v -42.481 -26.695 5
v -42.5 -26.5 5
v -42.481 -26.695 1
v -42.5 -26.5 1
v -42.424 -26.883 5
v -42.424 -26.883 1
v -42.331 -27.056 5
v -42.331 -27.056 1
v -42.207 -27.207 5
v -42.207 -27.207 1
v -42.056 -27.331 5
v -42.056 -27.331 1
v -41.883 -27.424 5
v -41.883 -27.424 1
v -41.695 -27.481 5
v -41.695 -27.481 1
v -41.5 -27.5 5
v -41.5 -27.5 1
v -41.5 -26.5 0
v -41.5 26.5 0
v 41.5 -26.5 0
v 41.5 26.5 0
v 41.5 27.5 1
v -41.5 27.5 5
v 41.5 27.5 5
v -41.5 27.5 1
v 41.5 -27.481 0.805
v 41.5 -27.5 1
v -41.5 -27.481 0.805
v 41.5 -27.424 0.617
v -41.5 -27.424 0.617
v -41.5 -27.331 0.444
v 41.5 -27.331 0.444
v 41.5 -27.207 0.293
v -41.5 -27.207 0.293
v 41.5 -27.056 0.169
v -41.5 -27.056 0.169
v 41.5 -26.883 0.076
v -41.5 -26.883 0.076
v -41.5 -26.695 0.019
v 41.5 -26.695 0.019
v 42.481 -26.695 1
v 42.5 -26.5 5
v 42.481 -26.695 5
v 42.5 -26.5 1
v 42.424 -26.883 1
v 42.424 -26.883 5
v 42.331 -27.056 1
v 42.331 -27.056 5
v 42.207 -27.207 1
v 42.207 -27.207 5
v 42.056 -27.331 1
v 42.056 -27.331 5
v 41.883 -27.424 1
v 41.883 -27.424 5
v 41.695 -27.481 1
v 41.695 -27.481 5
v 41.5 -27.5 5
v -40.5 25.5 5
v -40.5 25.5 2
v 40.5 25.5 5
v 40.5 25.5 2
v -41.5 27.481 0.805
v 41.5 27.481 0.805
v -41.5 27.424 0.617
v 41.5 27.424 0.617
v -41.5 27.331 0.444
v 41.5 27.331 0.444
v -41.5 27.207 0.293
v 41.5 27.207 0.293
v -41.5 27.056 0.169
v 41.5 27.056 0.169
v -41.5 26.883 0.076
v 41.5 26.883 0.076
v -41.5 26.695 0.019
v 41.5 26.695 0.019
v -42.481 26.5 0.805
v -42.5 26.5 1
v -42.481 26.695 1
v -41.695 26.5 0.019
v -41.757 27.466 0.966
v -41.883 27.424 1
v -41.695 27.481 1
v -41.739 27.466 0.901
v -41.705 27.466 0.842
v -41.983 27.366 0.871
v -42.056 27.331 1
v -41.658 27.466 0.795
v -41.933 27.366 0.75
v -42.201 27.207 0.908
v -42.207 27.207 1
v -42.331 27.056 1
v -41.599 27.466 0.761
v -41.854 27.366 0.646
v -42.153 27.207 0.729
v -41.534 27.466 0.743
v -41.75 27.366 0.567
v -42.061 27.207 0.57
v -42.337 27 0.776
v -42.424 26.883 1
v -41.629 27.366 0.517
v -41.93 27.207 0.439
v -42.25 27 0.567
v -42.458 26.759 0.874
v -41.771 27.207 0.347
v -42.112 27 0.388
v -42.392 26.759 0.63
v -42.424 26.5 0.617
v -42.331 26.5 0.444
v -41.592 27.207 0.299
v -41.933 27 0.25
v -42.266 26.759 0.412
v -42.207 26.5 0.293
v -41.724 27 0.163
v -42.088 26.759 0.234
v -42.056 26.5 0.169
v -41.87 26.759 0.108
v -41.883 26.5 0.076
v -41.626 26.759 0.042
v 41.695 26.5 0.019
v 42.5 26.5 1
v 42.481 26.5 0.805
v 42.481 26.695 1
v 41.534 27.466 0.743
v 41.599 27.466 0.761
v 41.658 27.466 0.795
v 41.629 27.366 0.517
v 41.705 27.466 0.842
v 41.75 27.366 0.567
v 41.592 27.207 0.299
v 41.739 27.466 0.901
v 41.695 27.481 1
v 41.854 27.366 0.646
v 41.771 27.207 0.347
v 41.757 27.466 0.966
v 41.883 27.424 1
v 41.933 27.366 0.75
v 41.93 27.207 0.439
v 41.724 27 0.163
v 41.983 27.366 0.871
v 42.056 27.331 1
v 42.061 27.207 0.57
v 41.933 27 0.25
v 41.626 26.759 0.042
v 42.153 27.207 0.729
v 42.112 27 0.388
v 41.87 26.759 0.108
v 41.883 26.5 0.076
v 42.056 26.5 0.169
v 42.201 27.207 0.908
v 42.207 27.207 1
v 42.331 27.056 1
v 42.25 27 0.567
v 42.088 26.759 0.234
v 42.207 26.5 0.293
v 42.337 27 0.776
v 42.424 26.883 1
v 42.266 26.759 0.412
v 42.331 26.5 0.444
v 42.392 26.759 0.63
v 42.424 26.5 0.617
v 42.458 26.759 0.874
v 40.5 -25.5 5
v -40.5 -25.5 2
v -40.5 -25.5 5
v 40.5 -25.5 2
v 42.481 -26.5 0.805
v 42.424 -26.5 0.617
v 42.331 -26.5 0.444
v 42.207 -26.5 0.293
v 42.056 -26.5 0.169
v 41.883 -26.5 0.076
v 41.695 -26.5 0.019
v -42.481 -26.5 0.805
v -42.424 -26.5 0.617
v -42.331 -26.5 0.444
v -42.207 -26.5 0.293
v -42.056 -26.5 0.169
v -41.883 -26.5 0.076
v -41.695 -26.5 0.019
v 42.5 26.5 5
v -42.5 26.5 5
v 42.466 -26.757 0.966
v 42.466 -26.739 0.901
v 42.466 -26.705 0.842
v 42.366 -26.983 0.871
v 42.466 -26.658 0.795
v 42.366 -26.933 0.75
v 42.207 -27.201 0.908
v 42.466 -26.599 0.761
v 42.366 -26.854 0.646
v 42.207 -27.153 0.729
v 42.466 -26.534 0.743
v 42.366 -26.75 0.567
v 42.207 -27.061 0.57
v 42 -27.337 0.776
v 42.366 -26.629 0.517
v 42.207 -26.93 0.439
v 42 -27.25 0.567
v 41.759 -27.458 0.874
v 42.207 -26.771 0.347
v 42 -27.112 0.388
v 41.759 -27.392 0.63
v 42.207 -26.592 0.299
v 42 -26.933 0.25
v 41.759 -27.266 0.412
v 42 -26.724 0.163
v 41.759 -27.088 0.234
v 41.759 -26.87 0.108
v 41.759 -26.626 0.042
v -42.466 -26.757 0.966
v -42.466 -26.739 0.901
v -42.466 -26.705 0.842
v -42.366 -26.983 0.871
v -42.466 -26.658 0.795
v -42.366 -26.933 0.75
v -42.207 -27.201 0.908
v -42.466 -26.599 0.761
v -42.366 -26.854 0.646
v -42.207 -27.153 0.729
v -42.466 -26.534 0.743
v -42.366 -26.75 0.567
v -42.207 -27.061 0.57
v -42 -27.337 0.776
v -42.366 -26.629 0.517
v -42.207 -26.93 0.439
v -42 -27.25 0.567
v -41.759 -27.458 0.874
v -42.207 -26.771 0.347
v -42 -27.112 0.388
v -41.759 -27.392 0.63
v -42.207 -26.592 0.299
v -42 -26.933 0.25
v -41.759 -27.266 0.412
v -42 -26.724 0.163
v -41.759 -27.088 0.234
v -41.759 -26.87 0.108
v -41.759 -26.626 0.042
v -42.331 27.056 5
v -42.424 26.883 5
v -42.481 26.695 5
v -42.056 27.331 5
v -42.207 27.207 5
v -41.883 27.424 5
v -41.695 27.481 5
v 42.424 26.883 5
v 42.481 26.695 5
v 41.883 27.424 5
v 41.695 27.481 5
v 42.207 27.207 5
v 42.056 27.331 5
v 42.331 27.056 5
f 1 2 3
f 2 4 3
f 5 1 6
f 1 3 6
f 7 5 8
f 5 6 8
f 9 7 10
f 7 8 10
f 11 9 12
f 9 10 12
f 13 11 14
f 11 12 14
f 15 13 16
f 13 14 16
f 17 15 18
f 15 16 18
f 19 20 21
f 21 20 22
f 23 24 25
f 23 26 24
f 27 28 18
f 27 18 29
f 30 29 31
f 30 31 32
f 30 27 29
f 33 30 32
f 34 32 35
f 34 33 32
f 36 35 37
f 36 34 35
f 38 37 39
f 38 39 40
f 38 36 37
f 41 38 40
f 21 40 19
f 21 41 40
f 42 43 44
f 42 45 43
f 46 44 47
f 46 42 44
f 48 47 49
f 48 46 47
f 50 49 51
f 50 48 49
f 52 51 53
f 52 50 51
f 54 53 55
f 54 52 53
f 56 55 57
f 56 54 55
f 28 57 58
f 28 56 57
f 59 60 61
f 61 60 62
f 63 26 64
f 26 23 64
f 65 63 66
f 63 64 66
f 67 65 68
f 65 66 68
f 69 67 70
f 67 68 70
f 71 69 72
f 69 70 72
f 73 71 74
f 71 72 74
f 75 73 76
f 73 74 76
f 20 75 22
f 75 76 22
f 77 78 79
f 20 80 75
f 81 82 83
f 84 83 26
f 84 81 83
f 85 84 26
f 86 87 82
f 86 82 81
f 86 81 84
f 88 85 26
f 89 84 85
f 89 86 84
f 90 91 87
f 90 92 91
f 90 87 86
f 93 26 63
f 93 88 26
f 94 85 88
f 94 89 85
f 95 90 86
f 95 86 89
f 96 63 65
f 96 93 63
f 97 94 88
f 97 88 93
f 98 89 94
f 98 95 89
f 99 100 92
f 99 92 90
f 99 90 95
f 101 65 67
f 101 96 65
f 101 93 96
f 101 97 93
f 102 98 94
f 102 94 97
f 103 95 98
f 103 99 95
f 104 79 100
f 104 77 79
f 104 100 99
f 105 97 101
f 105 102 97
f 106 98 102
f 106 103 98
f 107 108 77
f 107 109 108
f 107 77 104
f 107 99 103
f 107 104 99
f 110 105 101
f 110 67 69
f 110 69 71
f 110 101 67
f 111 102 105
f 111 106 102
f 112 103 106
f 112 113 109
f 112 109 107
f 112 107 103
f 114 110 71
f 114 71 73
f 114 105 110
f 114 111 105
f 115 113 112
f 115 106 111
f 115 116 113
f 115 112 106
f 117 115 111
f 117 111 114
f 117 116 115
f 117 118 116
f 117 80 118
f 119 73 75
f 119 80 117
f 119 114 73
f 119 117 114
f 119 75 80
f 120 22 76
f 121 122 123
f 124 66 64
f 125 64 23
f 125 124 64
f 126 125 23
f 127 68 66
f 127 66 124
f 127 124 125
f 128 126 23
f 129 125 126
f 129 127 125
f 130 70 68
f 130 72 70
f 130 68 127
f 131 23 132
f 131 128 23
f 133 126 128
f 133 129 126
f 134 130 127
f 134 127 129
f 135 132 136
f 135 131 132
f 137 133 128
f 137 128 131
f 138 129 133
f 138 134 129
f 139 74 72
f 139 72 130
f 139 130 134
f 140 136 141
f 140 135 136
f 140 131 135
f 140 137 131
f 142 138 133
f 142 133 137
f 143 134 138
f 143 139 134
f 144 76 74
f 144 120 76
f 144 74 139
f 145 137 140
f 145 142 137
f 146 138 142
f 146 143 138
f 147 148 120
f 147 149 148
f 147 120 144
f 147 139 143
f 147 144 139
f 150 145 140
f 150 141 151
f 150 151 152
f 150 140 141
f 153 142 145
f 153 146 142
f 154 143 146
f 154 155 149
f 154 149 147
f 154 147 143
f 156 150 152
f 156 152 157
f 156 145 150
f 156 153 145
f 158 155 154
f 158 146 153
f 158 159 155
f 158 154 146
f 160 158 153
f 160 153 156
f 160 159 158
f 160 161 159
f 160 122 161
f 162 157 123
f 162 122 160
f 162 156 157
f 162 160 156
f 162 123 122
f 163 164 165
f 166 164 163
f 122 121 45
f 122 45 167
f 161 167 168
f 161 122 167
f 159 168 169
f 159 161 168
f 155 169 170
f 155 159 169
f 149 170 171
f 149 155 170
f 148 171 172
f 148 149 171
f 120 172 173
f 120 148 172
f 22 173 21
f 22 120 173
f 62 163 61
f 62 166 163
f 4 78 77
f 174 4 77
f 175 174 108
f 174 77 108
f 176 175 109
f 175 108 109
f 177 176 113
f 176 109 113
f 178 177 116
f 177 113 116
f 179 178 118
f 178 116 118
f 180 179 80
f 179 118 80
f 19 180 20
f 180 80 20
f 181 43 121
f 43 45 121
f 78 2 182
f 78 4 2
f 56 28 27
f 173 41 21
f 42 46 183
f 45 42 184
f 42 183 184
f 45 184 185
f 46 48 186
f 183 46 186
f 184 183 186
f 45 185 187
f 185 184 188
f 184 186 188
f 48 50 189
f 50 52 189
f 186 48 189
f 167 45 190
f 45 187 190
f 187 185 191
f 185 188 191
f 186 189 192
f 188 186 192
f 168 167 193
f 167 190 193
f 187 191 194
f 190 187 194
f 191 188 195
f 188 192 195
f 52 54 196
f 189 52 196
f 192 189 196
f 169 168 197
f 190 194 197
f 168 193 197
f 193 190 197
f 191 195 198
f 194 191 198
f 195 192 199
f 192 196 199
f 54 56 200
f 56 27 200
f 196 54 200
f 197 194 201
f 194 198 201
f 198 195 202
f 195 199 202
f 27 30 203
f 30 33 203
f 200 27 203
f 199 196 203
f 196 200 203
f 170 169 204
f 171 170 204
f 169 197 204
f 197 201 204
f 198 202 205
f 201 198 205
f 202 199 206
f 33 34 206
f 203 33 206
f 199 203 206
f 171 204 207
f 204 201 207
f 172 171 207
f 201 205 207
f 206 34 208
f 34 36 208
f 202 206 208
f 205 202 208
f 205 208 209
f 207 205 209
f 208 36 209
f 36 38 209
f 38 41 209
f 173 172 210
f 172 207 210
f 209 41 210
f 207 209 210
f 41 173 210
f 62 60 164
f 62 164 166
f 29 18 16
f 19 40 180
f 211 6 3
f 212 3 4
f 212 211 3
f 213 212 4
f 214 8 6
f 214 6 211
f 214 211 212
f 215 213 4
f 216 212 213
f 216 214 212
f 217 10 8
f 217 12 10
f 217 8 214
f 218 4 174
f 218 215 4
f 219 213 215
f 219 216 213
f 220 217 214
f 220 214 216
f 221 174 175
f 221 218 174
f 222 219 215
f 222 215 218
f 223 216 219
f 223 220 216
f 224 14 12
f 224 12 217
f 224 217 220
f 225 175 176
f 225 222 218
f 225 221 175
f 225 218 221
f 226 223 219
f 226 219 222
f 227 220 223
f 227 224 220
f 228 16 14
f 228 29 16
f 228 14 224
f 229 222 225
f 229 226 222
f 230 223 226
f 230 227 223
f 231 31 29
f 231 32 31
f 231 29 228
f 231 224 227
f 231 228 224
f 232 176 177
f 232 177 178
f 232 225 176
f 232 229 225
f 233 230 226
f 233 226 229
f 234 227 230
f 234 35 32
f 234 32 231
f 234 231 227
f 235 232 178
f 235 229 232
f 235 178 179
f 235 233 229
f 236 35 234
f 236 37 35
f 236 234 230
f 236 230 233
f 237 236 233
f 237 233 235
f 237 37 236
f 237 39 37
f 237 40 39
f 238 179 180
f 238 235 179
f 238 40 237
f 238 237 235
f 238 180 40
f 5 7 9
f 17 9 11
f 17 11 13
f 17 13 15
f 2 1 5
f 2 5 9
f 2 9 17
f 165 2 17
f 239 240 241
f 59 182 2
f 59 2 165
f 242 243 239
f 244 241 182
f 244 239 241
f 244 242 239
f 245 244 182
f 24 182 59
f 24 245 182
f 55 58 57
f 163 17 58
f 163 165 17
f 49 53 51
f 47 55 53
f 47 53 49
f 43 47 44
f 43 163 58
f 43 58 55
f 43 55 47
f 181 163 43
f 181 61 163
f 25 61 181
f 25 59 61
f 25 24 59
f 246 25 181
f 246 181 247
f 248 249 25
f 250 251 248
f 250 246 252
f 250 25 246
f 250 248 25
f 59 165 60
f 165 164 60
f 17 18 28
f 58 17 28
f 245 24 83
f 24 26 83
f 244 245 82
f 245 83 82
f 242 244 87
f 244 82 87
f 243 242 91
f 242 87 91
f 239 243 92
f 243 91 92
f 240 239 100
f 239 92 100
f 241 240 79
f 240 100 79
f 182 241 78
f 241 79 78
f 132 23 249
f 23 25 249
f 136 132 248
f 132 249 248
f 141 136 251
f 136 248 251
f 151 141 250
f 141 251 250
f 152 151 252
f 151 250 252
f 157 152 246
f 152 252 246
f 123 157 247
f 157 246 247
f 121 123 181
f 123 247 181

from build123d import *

# Parameters (mm, degrees)
F0_W     = 85
F0_H     = 55
F1_DEPTH = 5
F2_T     = -2
F3_R     = 1
F4_R     = 1
F5_R     = 1
F6_R     = 1


with BuildPart() as f1:
    # F0 (on Top) → F1 (new body)
    with BuildSketch(Plane.XY):
        Rectangle(F0_W, F0_H)
    extrude(amount=F1_DEPTH)

    # F2
    f2_openings = [f1.faces().sort_by_distance(p)[0] for p in [
        (0, 0, 5),
    ]]
    offset(amount=F2_T, openings=f2_openings)

    # F3
    f3_edges = [f1.edges().sort_by_distance(p)[0] for p in [
        (0, -27.5, 0),
    ]]
    fillet(f3_edges, radius=F3_R)

    # F4
    f4_edges = [f1.edges().sort_by_distance(p)[0] for p in [
        (-42.5, 0.5, 0),
    ]]
    fillet(f4_edges, radius=F4_R)

    # F5
    f5_edges = [f1.edges().sort_by_distance(p)[0] for p in [
        (42.5, 0.5, 0),
    ]]
    fillet(f5_edges, radius=F5_R)

    # F6
    f6_edges = [f1.edges().sort_by_distance(p)[0] for p in [
        (0, 27.5, 0),
    ]]
    fillet(f6_edges, radius=F6_R)


solid = f1.part
